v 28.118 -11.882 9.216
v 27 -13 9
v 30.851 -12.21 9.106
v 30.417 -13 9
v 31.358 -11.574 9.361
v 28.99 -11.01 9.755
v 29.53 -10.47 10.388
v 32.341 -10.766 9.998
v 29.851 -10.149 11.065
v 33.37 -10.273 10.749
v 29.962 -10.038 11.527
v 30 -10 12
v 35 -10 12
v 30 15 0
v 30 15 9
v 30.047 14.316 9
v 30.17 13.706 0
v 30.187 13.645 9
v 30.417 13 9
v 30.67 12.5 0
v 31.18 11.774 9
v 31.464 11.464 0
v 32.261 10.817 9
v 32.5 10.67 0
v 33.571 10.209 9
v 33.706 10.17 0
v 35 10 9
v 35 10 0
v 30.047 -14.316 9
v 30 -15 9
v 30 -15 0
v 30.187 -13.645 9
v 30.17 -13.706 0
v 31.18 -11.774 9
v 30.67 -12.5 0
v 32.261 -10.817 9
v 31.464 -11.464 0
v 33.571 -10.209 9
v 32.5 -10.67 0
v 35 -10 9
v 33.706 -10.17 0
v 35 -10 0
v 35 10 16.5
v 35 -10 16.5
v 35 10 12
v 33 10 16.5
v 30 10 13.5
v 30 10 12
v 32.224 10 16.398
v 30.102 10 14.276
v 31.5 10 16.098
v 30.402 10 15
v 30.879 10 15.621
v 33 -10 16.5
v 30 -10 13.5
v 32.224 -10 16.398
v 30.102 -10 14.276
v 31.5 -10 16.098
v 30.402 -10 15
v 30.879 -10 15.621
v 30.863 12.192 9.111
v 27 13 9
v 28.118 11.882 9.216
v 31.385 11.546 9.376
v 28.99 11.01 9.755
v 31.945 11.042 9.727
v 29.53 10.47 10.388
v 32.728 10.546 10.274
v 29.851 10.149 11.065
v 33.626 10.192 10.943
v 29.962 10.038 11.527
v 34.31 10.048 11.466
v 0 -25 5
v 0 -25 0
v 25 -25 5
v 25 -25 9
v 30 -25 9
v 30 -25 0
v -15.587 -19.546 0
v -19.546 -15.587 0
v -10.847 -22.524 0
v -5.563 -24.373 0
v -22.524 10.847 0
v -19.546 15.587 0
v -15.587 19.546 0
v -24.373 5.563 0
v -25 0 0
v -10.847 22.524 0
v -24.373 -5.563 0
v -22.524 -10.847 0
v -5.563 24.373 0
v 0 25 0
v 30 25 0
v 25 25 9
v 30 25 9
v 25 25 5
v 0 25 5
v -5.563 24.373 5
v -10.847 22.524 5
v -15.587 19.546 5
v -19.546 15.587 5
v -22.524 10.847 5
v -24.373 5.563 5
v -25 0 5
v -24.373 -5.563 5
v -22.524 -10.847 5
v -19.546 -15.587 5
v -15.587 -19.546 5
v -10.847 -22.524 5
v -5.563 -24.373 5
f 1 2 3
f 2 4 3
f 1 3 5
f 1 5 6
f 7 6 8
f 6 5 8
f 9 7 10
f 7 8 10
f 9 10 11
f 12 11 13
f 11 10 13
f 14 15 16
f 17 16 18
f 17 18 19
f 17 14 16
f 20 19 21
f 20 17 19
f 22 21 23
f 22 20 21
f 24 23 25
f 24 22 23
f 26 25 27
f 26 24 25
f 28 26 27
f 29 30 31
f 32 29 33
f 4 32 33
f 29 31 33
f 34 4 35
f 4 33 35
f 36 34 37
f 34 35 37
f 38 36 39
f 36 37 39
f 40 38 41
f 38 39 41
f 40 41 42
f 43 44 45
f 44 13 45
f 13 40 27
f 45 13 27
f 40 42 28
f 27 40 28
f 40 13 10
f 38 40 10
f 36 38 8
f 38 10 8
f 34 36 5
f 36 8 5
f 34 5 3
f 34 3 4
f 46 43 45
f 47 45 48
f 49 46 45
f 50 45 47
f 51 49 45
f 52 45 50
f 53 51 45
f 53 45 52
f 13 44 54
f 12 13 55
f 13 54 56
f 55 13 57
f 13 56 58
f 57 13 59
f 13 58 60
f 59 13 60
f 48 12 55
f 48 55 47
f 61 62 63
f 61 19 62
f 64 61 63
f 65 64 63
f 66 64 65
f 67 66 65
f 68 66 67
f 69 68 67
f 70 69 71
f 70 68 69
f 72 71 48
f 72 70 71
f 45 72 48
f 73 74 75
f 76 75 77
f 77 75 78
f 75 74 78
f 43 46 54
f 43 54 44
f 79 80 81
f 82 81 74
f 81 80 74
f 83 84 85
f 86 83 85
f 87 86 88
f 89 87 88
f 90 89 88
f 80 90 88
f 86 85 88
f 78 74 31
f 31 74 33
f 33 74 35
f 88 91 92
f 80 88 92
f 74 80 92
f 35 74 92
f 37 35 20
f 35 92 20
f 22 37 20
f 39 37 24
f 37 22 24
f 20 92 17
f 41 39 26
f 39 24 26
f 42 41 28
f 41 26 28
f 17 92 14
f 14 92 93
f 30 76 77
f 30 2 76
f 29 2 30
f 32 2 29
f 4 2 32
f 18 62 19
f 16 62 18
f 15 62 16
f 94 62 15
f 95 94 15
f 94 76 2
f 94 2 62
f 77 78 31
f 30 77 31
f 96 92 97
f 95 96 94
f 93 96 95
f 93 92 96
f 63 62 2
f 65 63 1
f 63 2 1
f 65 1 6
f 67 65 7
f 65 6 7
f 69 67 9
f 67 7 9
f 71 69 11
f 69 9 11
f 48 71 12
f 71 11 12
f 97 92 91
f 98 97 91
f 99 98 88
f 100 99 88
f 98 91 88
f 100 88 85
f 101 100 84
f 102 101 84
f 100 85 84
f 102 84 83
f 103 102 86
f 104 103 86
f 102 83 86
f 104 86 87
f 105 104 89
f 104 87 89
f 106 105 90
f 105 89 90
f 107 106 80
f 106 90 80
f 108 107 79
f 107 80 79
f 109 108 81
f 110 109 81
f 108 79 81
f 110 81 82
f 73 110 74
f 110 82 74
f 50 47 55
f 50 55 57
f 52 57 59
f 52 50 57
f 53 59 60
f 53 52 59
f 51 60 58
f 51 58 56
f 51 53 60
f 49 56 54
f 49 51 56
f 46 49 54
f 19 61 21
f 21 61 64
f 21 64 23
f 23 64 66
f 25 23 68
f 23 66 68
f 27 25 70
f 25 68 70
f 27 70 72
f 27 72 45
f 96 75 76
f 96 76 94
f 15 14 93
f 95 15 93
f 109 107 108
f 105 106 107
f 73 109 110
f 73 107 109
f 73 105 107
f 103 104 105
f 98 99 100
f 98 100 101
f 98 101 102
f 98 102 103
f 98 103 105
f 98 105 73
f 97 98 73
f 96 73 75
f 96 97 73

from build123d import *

# Parameters (mm, degrees)
F1_DEPTH     = 5
F2_W         = 5
F2_H         = 50
F3_DEPTH     = 4
F4_W         = 5
F4_H         = 20
F5_DEPTH     = 11.5
F6_T1_DEPTH  = 9
F7_T1_DEPTH  = 20
F7_T6_DEPTH  = 5
F7_S7_R      = 5.0000000001
F7_T8_DEPTH  = 5
F7_T12_DEPTH = 5
F7_S13_R     = 5.0000000001
F7_T14_DEPTH = 5
F7_T19_DEPTH = 12.5
F7_T24_DEPTH = 27.5
F7_T31_DEPTH = 27.5
F7_T35_DEPTH = 12.5
F7_T39_DEPTH = 35


# Not quite as in the source:
# - a fillet or chamfer that OpenCascade refuses, or shapes differently, is made with other operations: its cross-section is extruded or revolved along the edge and cut away or added


with BuildPart() as f1:
    # F0 (on Top) → F1 (new body)
    with BuildSketch(Plane.XY):
        with BuildLine():
            Line((30, 25), (0, 25))
            ThreePointArc((0, 25), (-25, 0), (0, -25))
            Line((0, -25), (30, -25))
            Line((30, -25), (30, -10))
            Line((30, -10), (35, -10))
            Line((35, -10), (35, 10))
            Line((35, 10), (30, 10))
            Line((30, 10), (30, 25))
        make_face()
    extrude(amount=F1_DEPTH)

    # F2 (on face) → F3 (join)
    with BuildSketch(Plane.XY.offset(5)):
        with Locations((27.5, 0)):
            Rectangle(F2_W, F2_H)
    extrude(amount=F3_DEPTH)

    # F4 (on face) → F5 (join)
    with BuildSketch(Plane.XY.offset(5)):
        with Locations((32.5, 0)):
            Rectangle(F4_W, F4_H)
    extrude(amount=F5_DEPTH)

    # F6: fillet of radius 5 on 3 edges, made by hand

    # F6_s2 → F6_t1 (join)
    with BuildSketch(Plane.XY):
        with BuildLine():
            ThreePointArc((30, -15), (31.4644660941, -11.4644660941), (35, -10))
            Line((35, -10), (30, -10))
            Line((30, -10), (30, -15))
        make_face()
        with BuildLine():
            ThreePointArc((30, 15), (31.4644660941, 11.4644660941), (35, 10))
            Line((35, 10), (30, 10))
            Line((30, 10), (30, 15))
        make_face()
    extrude(amount=F6_T1_DEPTH)

    # F7: fillet of radius 3 on 4 edges, made by hand

    # F7_s2 → F7_t1 (join)
    with BuildSketch(Plane.XZ.offset(-10)):
        with BuildLine():
            ThreePointArc((27, 9), (29.1213203436, 9.8786796564), (30, 12))
            Line((30, 12), (30, 9))
            Line((30, 9), (27, 9))
        make_face()
    extrude(amount=F7_T1_DEPTH)


with BuildPart() as f7_tool4:
    # F7_s5 → F7_t6 (new body)
    with BuildSketch(Plane.YZ.offset(35)):
        with BuildLine():
            ThreePointArc((-13, 9), (-10.8786796564, 9.8786796564), (-10, 12))
            Line((-10, 12), (-10, 9))
            Line((-10, 9), (-13, 9))
        make_face()
    extrude(amount=-F7_T6_DEPTH)

    # F7_s7 → F7_t8 (cut, symmetric)
    with BuildSketch(Plane.XY.offset(10.5)):
        with Locations((35.0000000001, -15.0000000001)):
            Circle(F7_S7_R)
    extrude(amount=F7_T8_DEPTH, both=True, mode=Mode.SUBTRACT)


with BuildPart() as f1_1:
    add(f1.part)

    # F7_t3: union F7_tool4
    add(f7_tool4.part)


with BuildPart() as f7_tool10:
    # F7_s11 → F7_t12 (new body)
    with BuildSketch(Plane.YZ.offset(35)):
        with BuildLine():
            ThreePointArc((13, 9), (10.8786796564, 9.8786796564), (10, 12))
            Line((10, 12), (10, 9))
            Line((10, 9), (13, 9))
        make_face()
    extrude(amount=-F7_T12_DEPTH)

    # F7_s13 → F7_t14 (cut, symmetric)
    with BuildSketch(Plane.XY.offset(10.5)):
        with Locations((35.0000000001, 15.0000000001)):
            Circle(F7_S13_R)
    extrude(amount=F7_T14_DEPTH, both=True, mode=Mode.SUBTRACT)


with BuildPart() as f1_2:
    add(f1_1.part)

    # F7_t9: union F7_tool10
    add(f7_tool10.part)


with BuildPart() as f7_tool17:
    # F7_s18 → F7_t19 (new body)
    with BuildSketch(Plane.YZ.offset(35)):
        with BuildLine():
            ThreePointArc((-13, 9), (-10.8786796564, 9.8786796564), (-10, 12))
            Line((-10, 12), (-10, 9))
            Line((-10, 9), (-13, 9))
        make_face()
    extrude(amount=-F7_T19_DEPTH)

    split(bisect_by=Plane.YZ.offset(25), keep=Keep.TOP)

    split(bisect_by=Plane.YZ.offset(30), keep=Keep.BOTTOM)


with BuildPart() as f7_tool22:
    # F7_s23 → F7_t24 (new body)
    with BuildSketch(Plane.XZ.offset(17.5)):
        with BuildLine():
            ThreePointArc((27, 9), (29.1213203436, 9.8786796564), (30, 12))
            Line((30, 12), (30, 9))
            Line((30, 9), (27, 9))
        make_face()
    extrude(amount=-F7_T24_DEPTH)

    split(bisect_by=Plane.XZ.offset(10), keep=Keep.TOP)


with BuildPart() as f7_tool17_1:
    add(f7_tool17.part)

    # F7_t26: intersect F7_tool22
    add(f7_tool22.part, mode=Mode.INTERSECT)


with BuildPart() as f1_3:
    add(f1_2.part)

    # F7_t15: union F7_tool17
    add(f7_tool17_1.part)


with BuildPart() as f7_tool29:
    # F7_s30 → F7_t31 (new body)
    with BuildSketch(Plane.XZ.offset(10)):
        with BuildLine():
            ThreePointArc((27, 9), (29.1213203436, 9.8786796564), (30, 12))
            Line((30, 12), (30, 9))
            Line((30, 9), (27, 9))
        make_face()
    extrude(amount=-F7_T31_DEPTH)

    split(bisect_by=Plane.XZ.offset(-10), keep=Keep.BOTTOM)


with BuildPart() as f7_tool33:
    # F7_s34 → F7_t35 (new body)
    with BuildSketch(Plane.YZ.offset(35)):
        with BuildLine():
            ThreePointArc((13, 9), (10.8786796564, 9.8786796564), (10, 12))
            Line((10, 12), (10, 9))
            Line((10, 9), (13, 9))
        make_face()
    extrude(amount=-F7_T35_DEPTH)

    split(bisect_by=Plane.YZ.offset(25), keep=Keep.TOP)

    split(bisect_by=Plane.YZ.offset(30), keep=Keep.BOTTOM)


with BuildPart() as f7_tool29_1:
    add(f7_tool29.part)

    # F7_t38: intersect F7_tool33
    add(f7_tool33.part, mode=Mode.INTERSECT)


with BuildPart() as f1_4:
    add(f1_3.part)

    # F7_t27: union F7_tool29
    add(f7_tool29_1.part)

    # F7_s40 → F7_t39 (cut)
    with BuildSketch(Plane.XZ.offset(-17.5)):
        with BuildLine():
            ThreePointArc((30, 13.5), (30.8786796564, 15.6213203436), (33, 16.5))
            Line((33, 16.5), (30, 16.5))
            Line((30, 16.5), (30, 13.5))
        make_face()
    extrude(amount=F7_T39_DEPTH, mode=Mode.SUBTRACT)


solid = f1_4.part
